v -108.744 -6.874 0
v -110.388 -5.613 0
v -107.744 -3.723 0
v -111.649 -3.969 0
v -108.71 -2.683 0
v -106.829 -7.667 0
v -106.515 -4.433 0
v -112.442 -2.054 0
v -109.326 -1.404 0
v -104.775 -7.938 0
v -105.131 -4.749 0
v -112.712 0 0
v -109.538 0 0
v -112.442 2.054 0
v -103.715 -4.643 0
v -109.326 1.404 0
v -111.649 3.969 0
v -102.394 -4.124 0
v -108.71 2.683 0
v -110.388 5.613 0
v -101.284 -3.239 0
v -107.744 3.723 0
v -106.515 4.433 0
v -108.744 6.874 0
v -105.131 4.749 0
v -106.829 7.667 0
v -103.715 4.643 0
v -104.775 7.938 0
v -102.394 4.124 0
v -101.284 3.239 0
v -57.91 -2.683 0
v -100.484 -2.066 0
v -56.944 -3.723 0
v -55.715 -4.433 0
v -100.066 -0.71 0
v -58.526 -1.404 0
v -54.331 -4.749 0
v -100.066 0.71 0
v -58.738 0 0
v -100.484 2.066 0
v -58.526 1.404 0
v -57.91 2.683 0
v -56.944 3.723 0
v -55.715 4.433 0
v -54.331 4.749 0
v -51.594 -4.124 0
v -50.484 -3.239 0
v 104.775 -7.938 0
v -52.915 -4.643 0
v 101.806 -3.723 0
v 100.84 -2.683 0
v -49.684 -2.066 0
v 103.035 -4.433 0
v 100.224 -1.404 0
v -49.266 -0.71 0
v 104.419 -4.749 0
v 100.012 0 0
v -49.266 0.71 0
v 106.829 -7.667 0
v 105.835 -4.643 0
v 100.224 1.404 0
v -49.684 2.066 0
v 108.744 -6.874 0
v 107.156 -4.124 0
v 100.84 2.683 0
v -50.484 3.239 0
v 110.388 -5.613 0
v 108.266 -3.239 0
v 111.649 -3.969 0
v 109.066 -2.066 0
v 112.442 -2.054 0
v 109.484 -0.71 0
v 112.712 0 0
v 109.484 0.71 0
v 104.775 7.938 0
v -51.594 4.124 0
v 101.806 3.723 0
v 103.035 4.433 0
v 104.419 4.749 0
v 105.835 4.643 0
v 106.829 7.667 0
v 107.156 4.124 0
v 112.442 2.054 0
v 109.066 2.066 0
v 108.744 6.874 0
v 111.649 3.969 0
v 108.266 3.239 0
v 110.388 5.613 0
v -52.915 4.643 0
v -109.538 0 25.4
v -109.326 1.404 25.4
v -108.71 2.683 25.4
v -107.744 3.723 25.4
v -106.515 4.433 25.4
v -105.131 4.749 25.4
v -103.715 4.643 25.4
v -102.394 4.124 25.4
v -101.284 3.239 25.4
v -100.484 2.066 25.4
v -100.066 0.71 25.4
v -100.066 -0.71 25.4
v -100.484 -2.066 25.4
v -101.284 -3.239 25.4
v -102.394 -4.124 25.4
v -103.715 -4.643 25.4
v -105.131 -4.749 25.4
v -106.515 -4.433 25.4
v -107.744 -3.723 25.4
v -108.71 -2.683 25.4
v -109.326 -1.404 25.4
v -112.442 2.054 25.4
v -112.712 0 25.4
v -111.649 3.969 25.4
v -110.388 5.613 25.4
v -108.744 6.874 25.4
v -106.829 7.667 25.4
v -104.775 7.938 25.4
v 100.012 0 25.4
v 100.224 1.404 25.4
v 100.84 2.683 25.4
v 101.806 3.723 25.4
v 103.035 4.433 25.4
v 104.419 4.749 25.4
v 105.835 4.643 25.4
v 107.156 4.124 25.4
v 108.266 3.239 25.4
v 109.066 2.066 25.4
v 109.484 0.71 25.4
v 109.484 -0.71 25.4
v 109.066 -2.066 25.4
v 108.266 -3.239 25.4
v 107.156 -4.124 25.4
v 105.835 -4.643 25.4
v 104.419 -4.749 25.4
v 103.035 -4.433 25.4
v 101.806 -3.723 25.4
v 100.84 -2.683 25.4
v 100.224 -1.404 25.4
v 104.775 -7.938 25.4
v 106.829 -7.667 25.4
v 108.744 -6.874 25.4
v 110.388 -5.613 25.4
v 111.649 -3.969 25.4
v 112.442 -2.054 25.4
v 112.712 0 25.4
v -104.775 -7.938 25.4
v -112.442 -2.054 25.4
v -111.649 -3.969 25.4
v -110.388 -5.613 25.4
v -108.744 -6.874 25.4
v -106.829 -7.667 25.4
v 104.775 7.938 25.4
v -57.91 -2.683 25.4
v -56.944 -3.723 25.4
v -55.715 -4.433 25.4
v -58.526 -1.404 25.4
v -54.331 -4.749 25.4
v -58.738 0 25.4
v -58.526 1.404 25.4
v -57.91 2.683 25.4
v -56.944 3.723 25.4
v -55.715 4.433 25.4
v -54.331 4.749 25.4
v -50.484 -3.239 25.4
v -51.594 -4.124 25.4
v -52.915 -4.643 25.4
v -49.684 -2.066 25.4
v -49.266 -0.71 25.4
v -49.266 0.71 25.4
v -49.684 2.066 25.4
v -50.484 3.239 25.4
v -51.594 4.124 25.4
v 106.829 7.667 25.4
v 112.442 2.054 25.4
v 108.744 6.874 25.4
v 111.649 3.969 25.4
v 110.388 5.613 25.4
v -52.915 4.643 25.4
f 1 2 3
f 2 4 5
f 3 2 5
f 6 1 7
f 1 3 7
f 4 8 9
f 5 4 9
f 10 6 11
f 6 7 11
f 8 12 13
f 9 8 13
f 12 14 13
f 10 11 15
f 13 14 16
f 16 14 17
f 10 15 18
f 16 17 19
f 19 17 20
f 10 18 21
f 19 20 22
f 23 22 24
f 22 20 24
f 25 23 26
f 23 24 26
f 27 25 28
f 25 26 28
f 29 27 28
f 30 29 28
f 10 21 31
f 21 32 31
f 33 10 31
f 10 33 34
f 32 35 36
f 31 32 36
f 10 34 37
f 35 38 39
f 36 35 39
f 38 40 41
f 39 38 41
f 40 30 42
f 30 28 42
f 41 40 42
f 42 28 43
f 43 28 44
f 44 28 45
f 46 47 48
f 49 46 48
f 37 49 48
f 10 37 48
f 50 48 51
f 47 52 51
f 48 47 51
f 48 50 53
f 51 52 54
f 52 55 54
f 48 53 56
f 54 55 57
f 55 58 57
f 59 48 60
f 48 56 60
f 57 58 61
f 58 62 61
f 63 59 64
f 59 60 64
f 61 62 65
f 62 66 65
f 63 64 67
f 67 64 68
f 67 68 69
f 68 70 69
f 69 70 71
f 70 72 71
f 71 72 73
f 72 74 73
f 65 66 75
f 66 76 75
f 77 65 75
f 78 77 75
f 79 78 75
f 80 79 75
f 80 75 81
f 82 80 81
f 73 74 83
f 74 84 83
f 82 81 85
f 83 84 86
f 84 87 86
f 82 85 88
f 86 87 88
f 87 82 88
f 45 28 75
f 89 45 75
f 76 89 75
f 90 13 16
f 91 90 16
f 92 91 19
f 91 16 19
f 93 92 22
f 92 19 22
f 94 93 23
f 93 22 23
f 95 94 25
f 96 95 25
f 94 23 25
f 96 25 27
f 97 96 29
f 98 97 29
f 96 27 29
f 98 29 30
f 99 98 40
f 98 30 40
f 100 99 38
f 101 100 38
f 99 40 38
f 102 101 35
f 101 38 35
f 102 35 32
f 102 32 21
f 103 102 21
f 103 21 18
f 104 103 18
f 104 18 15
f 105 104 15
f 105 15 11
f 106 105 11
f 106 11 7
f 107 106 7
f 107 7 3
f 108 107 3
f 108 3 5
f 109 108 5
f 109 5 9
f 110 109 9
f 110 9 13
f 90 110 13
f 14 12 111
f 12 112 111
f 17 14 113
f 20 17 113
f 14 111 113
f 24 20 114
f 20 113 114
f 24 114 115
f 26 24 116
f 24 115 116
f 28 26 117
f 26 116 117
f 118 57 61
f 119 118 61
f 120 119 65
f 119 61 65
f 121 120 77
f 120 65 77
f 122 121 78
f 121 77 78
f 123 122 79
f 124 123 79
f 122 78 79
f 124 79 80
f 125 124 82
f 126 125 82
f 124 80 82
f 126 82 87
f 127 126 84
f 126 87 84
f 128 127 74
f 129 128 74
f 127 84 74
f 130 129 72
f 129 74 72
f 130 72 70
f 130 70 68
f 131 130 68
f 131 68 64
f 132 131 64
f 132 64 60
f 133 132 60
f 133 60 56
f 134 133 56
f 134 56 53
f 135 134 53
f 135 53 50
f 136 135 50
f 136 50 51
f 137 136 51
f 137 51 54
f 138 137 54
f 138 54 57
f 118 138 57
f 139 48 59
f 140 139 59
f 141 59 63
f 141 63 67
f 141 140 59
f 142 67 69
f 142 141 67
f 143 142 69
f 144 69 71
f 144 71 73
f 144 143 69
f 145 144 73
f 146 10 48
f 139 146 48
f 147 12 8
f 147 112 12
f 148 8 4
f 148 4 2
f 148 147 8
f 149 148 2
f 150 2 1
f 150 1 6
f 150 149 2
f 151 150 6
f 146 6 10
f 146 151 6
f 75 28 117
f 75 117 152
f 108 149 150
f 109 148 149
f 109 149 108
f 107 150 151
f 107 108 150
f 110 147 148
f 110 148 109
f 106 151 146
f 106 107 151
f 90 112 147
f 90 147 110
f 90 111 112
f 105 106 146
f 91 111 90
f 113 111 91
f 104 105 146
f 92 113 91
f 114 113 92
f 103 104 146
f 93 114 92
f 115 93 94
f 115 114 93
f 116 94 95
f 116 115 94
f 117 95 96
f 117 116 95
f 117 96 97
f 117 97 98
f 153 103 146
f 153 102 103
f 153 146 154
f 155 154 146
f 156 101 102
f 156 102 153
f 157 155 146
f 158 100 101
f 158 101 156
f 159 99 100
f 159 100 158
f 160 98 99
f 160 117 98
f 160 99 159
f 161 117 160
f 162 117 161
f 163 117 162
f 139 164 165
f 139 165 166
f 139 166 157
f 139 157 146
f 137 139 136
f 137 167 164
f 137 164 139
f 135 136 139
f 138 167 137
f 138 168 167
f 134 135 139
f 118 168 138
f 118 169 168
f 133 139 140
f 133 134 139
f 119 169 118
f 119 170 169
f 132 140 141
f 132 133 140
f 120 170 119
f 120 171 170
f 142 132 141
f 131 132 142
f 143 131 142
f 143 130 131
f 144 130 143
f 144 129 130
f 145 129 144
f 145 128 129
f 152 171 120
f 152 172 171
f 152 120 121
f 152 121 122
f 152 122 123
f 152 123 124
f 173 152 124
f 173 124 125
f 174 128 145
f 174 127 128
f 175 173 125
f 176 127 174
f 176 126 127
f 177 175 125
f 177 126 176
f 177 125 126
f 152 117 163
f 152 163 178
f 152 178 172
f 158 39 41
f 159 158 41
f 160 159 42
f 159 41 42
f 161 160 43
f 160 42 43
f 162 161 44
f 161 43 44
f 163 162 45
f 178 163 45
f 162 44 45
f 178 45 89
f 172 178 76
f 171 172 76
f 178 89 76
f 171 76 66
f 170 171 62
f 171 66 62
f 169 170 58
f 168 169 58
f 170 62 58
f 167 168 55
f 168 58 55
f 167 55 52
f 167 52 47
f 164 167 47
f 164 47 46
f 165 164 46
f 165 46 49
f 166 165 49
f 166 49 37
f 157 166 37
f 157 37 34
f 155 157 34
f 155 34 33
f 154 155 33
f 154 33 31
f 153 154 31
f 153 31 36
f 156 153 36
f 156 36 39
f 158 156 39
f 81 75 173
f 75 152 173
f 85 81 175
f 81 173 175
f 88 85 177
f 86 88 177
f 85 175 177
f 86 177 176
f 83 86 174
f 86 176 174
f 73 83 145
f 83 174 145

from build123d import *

# Parameters (mm, degrees)
F0_W     = 225.425
F0_H     = 15.875
F1_DEPTH = 25.4
F3_D     = 9.525
F4_R     = 7.93749


# Not quite as in the source:
# - a fillet or chamfer is up to 0.001 mm smaller than in the source, because OpenCascade refuses the exact size


with BuildPart() as f1:
    # F0 (on Top) → F1 (new body)
    with BuildSketch(Plane.XY):
        Rectangle(F0_W, F0_H)
    extrude(amount=F1_DEPTH)

    # F3 (through all)
    with Locations(Plane.XY.offset(25.4)):
        with Locations((104.775, 0), (-104.775, 0), (-53.975, 0)):
            Hole(F3_D / 2)

    # F4 (radius 7.9375 in the source; OpenCascade refuses exactly that, so slightly less here)
    f4_edges = [f1.edges().sort_by_distance(p)[0] for p in [
        (-112.7125, -7.9375, 12.7),
        (112.7125, -7.9375, 12.7),
        (112.7125, 7.9375, 12.7),
        (-112.7125, 7.9375, 12.7),
    ]]
    fillet(f4_edges, radius=F4_R)


solid = f1.part
